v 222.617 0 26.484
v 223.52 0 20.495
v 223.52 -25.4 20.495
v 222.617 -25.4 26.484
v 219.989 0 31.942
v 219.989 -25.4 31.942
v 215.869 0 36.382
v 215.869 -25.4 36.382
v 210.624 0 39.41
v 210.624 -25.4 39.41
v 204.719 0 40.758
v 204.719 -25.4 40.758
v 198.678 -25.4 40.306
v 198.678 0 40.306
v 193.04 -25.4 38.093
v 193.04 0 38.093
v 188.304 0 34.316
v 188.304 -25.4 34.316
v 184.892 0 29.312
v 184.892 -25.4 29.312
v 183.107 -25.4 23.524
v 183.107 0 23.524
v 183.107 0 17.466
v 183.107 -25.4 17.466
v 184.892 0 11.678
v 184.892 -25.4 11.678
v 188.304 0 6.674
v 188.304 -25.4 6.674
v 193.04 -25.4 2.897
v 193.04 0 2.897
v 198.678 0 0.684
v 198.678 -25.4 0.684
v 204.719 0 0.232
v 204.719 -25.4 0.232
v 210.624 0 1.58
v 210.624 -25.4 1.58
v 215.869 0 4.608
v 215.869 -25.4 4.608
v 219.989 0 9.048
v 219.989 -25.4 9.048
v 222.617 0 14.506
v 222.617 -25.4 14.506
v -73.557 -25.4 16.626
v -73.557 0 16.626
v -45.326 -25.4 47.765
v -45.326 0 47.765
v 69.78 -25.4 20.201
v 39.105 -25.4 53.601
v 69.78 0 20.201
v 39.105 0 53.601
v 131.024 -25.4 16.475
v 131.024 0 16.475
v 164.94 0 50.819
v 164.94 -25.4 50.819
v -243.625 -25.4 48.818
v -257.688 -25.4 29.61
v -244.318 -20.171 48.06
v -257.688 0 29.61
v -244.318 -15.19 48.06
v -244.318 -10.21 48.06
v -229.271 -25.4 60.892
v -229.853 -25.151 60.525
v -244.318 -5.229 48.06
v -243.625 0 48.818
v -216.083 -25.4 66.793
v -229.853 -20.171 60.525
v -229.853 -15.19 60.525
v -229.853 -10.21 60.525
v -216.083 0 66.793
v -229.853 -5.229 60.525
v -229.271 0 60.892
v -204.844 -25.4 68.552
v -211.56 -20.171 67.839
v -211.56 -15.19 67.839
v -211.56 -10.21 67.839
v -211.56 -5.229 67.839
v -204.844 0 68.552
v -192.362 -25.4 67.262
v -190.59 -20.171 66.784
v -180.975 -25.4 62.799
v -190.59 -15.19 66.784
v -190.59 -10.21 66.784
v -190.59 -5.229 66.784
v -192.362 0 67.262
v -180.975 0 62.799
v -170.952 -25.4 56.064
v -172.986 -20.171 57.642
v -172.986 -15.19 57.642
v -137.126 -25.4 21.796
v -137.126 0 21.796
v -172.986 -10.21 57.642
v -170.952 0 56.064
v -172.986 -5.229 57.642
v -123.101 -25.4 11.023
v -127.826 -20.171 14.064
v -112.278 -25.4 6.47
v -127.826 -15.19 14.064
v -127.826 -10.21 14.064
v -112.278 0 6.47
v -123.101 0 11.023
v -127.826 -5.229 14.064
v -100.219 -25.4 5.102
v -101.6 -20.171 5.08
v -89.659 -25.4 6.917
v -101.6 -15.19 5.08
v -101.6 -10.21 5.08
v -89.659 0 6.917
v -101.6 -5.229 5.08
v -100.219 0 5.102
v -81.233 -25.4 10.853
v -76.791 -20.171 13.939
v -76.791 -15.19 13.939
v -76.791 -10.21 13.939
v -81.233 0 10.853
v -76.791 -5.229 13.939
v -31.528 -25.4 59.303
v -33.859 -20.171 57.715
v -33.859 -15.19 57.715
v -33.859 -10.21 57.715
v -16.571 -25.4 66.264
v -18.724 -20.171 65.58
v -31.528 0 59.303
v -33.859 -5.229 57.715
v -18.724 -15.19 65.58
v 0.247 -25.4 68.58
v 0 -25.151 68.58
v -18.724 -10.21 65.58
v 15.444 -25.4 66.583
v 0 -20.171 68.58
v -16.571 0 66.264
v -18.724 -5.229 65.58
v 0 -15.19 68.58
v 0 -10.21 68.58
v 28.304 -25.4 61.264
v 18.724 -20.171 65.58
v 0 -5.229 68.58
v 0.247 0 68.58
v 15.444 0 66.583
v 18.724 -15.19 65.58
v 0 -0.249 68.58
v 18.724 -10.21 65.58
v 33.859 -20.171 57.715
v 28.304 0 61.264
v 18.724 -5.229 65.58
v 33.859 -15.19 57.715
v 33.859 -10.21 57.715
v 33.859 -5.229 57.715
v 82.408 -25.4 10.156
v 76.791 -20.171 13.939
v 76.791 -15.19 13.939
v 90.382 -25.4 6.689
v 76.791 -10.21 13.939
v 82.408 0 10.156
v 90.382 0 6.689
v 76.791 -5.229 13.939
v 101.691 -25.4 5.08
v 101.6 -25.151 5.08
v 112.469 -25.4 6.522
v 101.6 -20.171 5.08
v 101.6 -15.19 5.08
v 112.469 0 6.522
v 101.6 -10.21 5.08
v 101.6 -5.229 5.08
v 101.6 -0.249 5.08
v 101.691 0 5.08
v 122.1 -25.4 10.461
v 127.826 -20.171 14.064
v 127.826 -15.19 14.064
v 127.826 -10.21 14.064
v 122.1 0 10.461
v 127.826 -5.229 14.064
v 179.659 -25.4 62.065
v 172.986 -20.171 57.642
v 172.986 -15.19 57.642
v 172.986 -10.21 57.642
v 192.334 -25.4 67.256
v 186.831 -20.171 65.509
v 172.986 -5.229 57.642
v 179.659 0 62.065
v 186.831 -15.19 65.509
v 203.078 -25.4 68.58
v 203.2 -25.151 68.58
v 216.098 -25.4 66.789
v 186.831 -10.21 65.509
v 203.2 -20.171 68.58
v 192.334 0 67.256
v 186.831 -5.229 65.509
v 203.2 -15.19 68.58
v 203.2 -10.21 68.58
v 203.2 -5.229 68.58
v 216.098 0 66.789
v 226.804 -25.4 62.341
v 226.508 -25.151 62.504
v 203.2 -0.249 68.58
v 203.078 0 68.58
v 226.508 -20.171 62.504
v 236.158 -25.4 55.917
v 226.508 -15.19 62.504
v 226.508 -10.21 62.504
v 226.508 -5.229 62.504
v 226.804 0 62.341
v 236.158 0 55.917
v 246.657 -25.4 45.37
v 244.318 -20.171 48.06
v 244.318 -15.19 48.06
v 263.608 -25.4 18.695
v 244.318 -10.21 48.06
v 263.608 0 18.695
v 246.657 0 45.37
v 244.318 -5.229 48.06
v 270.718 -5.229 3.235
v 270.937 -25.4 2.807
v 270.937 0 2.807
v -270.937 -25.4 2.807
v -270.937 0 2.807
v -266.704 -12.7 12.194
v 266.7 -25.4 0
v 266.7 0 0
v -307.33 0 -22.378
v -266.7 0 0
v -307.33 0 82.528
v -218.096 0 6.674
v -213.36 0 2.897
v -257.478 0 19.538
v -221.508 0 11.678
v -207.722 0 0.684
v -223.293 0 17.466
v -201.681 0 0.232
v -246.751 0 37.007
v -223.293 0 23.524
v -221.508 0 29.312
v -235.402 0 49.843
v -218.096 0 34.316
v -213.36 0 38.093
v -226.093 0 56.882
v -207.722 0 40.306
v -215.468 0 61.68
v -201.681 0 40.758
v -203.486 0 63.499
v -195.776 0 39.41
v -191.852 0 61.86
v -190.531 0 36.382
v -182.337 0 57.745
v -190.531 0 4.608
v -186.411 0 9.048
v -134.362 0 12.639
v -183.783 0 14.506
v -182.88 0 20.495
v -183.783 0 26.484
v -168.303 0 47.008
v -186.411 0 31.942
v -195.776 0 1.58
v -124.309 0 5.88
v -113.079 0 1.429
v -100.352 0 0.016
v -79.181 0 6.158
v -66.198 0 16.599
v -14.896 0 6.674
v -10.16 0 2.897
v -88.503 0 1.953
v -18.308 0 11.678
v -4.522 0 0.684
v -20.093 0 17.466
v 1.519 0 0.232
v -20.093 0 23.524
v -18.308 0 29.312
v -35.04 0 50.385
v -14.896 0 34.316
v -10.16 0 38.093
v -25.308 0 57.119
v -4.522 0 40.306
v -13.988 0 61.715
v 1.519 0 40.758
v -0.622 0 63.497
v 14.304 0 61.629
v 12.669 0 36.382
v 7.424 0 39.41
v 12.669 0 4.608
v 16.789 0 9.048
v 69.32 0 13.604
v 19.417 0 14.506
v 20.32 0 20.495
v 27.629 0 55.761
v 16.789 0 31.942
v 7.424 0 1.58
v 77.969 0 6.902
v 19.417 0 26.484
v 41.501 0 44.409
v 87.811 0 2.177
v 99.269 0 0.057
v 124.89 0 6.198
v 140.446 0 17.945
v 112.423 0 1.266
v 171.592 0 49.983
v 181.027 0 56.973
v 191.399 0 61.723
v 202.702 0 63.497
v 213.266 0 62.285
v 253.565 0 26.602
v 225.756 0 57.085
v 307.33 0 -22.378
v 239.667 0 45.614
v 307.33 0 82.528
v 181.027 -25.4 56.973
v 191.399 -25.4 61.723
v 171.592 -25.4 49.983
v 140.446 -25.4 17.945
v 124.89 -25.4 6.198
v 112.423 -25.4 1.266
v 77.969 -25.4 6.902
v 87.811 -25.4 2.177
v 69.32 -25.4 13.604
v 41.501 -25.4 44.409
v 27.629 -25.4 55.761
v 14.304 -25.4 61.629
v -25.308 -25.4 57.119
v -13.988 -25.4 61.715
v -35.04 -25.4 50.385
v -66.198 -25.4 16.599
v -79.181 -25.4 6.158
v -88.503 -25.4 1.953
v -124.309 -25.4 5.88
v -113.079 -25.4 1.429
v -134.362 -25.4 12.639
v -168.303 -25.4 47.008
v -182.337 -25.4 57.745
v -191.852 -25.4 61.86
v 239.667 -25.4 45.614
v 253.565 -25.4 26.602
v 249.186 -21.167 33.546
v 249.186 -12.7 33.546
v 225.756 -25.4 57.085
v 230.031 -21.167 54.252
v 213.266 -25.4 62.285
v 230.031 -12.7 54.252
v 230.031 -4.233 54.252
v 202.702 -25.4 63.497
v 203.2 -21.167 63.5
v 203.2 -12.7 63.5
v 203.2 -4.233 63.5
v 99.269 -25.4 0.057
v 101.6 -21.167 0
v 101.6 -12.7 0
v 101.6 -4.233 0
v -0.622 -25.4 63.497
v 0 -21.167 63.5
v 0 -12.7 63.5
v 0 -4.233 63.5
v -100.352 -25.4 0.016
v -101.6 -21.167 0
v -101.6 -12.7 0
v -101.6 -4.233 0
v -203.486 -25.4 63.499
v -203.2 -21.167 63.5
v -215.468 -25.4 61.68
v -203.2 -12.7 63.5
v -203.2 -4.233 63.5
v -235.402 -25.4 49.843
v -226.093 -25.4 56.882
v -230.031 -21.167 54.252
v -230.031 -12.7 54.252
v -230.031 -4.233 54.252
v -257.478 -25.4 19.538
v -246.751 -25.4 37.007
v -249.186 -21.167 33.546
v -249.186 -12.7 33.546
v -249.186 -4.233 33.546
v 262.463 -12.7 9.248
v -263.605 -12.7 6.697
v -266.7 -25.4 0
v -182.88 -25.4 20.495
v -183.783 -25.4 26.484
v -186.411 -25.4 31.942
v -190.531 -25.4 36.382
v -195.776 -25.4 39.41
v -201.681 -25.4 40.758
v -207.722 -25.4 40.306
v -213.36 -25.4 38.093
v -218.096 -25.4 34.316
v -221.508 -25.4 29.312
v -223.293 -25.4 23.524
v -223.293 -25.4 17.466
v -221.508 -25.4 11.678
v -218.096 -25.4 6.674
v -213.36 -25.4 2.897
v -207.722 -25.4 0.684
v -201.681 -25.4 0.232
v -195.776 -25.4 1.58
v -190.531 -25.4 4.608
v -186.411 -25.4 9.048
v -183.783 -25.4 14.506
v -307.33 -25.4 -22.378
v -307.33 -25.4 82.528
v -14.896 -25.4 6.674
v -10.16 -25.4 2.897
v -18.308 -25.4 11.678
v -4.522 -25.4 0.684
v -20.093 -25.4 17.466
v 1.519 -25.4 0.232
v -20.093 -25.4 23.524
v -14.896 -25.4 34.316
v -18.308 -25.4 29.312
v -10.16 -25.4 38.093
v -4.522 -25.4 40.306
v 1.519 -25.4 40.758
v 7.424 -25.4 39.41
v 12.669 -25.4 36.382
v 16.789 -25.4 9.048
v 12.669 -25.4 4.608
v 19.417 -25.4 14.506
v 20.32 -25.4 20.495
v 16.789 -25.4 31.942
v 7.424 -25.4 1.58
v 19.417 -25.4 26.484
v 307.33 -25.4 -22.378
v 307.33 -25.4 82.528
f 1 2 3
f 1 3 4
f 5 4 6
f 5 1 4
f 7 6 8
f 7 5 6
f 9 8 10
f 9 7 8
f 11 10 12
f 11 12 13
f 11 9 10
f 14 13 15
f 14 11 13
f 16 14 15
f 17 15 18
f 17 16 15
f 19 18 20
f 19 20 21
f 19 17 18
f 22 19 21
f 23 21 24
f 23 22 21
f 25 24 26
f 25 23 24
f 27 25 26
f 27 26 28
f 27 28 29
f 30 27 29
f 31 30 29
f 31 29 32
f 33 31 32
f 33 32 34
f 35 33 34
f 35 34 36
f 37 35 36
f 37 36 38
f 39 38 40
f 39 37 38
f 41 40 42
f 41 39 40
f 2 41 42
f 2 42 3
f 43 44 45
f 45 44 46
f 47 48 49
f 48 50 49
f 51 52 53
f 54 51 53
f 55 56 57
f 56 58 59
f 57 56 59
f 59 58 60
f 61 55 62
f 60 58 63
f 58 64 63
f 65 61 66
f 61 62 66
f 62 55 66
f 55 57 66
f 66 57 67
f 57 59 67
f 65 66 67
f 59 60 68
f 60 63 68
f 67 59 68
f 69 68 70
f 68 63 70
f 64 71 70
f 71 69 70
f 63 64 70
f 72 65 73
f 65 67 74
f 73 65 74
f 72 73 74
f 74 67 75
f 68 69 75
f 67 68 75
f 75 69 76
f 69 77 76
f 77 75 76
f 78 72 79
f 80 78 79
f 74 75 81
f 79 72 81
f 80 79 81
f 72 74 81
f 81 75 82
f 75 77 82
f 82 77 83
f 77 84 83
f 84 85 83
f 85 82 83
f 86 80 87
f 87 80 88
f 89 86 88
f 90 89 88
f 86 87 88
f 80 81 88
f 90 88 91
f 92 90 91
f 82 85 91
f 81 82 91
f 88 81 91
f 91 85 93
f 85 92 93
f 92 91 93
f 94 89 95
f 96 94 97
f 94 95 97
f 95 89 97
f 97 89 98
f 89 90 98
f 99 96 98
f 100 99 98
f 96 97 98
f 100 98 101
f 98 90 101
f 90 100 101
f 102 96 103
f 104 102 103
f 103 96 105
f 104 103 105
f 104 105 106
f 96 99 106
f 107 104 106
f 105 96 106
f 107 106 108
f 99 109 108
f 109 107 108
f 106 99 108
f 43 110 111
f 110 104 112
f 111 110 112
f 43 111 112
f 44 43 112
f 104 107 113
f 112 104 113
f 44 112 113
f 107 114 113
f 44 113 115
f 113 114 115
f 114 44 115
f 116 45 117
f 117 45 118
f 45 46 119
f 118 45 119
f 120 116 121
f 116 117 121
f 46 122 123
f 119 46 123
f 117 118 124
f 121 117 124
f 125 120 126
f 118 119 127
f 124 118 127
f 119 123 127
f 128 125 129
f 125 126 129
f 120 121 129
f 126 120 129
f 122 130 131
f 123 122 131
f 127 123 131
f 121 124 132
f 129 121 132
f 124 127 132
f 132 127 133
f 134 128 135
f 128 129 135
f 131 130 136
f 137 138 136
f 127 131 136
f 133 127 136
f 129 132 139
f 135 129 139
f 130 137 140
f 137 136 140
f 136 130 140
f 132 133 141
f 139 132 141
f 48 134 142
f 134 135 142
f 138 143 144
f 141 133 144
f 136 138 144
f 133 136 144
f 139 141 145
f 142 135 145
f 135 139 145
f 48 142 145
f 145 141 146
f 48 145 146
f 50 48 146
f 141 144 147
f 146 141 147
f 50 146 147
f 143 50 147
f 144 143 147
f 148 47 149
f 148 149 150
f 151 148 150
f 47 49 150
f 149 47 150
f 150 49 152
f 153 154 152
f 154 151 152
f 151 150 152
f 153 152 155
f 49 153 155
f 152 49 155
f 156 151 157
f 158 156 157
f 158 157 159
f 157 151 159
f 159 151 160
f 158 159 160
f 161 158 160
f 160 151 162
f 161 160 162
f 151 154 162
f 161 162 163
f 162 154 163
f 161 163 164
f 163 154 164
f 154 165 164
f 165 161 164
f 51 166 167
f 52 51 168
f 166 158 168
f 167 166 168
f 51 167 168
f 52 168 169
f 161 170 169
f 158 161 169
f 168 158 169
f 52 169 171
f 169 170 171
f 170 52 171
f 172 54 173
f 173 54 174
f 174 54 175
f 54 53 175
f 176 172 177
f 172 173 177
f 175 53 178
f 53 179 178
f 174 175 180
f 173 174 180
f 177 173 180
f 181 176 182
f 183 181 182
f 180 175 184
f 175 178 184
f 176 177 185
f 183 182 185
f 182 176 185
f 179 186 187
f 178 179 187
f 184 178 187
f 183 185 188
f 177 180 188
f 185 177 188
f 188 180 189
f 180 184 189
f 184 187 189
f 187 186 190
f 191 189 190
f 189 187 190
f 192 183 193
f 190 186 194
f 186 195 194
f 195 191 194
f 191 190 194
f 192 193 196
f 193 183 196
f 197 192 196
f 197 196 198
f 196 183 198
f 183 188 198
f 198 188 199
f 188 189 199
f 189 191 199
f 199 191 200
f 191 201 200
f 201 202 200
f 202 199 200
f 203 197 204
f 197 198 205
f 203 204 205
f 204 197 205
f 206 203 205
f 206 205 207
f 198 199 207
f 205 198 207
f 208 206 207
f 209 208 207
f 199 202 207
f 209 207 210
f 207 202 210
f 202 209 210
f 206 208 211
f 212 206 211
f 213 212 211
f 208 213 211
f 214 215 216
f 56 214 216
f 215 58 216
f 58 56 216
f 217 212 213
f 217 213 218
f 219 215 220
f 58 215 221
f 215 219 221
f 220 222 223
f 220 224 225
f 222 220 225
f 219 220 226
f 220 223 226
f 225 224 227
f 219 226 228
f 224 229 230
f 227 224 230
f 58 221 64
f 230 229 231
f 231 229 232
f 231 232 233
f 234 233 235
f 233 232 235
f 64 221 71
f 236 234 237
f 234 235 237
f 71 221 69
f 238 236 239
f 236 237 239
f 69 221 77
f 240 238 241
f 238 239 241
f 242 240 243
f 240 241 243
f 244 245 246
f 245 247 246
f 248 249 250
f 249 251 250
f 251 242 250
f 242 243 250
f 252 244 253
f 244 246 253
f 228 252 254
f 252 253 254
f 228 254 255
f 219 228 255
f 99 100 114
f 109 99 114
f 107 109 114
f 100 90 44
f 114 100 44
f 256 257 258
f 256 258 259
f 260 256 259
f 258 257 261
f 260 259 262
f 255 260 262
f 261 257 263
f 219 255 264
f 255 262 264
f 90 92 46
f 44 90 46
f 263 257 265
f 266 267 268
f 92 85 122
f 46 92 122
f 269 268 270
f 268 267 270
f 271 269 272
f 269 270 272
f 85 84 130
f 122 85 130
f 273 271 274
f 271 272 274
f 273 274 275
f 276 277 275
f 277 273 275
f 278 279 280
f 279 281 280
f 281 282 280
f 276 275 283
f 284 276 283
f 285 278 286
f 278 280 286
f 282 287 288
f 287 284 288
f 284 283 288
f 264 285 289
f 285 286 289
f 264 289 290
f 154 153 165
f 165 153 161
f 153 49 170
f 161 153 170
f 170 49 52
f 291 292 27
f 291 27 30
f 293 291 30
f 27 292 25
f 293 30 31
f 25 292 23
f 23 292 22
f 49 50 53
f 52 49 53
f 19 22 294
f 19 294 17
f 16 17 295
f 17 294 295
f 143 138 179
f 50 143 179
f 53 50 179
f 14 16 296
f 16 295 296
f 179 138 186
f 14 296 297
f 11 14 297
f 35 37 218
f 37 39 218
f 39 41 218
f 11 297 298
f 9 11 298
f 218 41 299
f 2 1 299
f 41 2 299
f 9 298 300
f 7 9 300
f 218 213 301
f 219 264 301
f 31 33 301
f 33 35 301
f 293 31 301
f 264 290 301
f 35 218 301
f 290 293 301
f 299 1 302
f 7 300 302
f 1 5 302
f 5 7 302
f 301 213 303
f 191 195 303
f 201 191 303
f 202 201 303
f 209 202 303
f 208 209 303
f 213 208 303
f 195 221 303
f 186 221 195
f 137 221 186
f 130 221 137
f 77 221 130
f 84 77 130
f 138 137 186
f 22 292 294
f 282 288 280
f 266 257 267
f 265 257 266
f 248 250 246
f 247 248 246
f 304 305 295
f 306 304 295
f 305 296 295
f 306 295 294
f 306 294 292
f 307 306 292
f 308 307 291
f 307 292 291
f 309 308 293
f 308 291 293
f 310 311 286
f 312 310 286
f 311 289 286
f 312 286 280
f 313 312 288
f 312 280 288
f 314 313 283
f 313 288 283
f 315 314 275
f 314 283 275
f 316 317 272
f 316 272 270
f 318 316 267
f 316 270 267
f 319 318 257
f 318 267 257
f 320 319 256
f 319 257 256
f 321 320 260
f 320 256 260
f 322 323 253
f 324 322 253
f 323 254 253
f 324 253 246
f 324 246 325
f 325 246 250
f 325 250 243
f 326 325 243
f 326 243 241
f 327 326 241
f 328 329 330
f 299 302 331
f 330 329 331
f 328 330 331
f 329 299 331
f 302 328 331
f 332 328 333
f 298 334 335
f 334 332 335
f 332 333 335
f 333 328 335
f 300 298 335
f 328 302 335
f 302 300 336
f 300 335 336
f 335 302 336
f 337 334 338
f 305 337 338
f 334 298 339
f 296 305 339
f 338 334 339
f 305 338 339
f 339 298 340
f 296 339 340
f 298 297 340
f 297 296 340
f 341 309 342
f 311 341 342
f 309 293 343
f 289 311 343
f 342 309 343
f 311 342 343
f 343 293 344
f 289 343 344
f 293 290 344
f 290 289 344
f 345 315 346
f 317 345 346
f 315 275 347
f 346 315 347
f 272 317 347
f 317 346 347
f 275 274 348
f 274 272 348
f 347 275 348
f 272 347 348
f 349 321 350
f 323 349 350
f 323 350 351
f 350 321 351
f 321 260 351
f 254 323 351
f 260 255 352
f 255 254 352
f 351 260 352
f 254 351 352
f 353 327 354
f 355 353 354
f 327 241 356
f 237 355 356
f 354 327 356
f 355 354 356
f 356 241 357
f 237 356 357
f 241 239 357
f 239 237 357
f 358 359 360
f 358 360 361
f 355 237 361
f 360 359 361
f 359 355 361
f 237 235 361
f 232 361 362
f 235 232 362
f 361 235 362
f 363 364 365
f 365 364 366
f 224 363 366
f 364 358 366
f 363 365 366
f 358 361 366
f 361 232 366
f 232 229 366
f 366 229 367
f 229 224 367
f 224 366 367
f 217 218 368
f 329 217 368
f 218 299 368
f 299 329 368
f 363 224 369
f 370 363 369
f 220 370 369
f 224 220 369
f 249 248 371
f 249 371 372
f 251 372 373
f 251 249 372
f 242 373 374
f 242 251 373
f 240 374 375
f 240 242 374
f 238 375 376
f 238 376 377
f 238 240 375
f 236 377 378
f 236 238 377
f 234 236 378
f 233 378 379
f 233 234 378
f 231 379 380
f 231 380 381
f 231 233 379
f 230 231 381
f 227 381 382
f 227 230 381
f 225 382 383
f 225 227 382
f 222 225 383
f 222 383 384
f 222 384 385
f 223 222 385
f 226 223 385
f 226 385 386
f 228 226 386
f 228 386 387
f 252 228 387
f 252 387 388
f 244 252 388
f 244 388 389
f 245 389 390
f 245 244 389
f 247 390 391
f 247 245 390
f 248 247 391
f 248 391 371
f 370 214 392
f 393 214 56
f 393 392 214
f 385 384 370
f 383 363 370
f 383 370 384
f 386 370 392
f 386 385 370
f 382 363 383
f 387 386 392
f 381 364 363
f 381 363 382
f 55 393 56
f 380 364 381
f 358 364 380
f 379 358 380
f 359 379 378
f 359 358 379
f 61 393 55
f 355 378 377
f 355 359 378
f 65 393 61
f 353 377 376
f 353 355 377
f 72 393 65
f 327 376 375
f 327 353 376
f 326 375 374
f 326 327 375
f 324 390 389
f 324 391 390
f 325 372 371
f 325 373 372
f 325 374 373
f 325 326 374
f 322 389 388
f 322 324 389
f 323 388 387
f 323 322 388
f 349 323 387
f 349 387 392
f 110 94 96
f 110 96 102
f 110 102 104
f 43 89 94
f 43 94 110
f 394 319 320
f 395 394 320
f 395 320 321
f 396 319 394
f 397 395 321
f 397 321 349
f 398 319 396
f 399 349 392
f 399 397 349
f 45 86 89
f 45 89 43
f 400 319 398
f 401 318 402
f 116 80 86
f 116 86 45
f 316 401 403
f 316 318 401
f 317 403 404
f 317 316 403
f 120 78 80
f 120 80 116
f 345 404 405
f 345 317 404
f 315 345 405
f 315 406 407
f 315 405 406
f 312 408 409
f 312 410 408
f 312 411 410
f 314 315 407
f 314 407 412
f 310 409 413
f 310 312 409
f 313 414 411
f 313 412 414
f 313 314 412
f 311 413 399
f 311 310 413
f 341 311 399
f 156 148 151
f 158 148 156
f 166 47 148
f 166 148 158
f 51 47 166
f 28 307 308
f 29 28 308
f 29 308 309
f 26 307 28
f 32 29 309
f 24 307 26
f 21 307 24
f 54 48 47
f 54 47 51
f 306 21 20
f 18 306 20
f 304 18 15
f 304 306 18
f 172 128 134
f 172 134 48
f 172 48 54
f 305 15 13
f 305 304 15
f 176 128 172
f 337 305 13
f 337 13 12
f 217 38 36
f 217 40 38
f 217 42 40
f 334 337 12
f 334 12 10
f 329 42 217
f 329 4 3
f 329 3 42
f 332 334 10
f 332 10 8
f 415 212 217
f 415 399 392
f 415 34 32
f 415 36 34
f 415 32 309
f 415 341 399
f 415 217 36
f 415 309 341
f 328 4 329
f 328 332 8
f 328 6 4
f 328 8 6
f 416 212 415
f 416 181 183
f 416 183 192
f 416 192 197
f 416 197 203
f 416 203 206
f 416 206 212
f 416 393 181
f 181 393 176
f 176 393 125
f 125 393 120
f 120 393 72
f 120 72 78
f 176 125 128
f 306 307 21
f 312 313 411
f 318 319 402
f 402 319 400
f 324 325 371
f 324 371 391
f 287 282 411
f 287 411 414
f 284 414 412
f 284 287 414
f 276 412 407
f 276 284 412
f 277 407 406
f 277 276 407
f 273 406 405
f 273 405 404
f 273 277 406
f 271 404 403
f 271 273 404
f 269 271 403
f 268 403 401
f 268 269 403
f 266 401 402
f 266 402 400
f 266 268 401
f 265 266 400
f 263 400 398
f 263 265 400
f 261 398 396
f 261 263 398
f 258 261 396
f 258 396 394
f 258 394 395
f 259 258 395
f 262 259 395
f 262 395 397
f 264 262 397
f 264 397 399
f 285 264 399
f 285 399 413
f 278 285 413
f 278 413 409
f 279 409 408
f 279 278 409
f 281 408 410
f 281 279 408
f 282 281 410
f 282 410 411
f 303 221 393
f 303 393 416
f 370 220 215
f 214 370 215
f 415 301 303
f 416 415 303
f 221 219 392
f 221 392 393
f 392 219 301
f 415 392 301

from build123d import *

# Parameters (mm, degrees)
F0_W     = 614.6593689919
F0_H     = 104.9060299742
F0_R     = 20.32
F1_DEPTH = 25.4


# Not quite as in the source:
# - ends of sketch curves that miss each other by under 0.0002 mm in the source are joined
# - the dataset's text gives a spline's control points without its knots; the knots are read off the source's solid


with BuildPart() as f1:
    # F0 (on Front) → F1 (new body)
    with BuildSketch(Plane.XZ):
        with Locations((0, 30.0749056167)):
            Rectangle(F0_W, F0_H)
        with Locations((-203.2, 20.4950086772)):
            Circle(F0_R, mode=Mode.SUBTRACT)
        with Locations((0, 20.4950086772)):
            Circle(F0_R, mode=Mode.SUBTRACT)
        with Locations((203.2, 20.4950086772)):
            Circle(F0_R, mode=Mode.SUBTRACT)
        with BuildLine():
            add(Edge.make_bspline(
                [(0, 63.5), (50.8, 63.5), (56.1175370932, 0), (101.6, 0)],
                knots=[0, 0, 0, 0, 119.8115603771, 119.8115603771, 119.8115603771, 119.8115603771], degree=3))
            add(Edge.make_bspline(
                [(0, 63.5), (-50.8, 63.5), (-56.1175370932, 0), (-101.6, 0)],
                knots=[0, 0, 0, 0, 119.8115603771, 119.8115603771, 119.8115603771, 119.8115603771], degree=3))
            add(Edge.make_bspline(
                [(-101.6, 0), (-147.0824629068, 0), (-161.2765789032, 63.5), (-203.2, 63.5)],
                knots=[0, 0, 0, 0, 119.8115603771, 119.8115603771, 119.8115603771, 119.8115603771], degree=3))
            add(Edge.make_bspline(
                [(-203.2, 63.5), (-244.3384826183, 63.5), (-263.5250381589, 4.789814353), (-266.7, 0)],
                knots=[0, 0, 0, 0, 89.8025612107, 89.8025612107, 89.8025612107, 89.8025612107], degree=3))
            Line((-266.7, 0), (-270.9370674539, 2.8072381066))
            add(Edge.make_bspline(
                [(-203.2, 68.58), (-206.0749247482, 68.58), (-211.6570572562, 68.0654677515), (-219.449703116, 65.9327946823), (-226.6139167838, 62.6573237184), (-235.3214664022, 57.0619610705), (-242.8084043286, 50.0452799381), (-249.2087272272, 42.3342188514), (-253.4945356129, 36.3678079721), (-257.2899146838, 30.3831174449), (-260.614540304, 24.5429222876), (-263.4845904473, 19.0110013278), (-265.5085267197, 14.7960229142), (-266.9118861506, 11.7464153334), (-267.8572021622, 9.6427688992), (-268.6955290239, 7.7460864416), (-269.4259857327, 6.0820696315), (-269.9424600992, 4.9140477877), (-270.2959565612, 4.1311962061), (-270.5287914392, 3.627286717), (-270.6926175205, 3.2849255658), (-270.8015436387, 3.065424442), (-270.8703935577, 2.930969375), (-270.9134306119, 2.8501874319), (-270.9322031409, 2.8160102358), (-270.9370674539, 2.8072381066)],
                knots=[0, 0, 0, 0, 0.062536818, 0.125073636, 0.1876104541, 0.2501472721, 0.3752209081, 0.4377577261, 0.5002945442, 0.5628313622, 0.6253681802, 0.6879049982, 0.7504418162, 0.7817102252, 0.8129786342, 0.8442470433, 0.8755154523, 0.9067838613, 0.9224180658, 0.9380522703, 0.9536864748, 0.961503577, 0.9693206793, 0.9771377815, 0.9803545729, 0.9803545729, 0.9803545729, 0.9803545729], degree=3))
            add(Edge.make_bspline(
                [(-101.6, 5.08), (-104.1471371, 5.08), (-108.9825494519, 5.5227985642), (-115.6526939013, 7.3372474831), (-121.9092103663, 10.1773367447), (-127.8642663749, 13.932751749), (-133.5886395499, 18.4728381682), (-140.9907545945, 25.3635161712), (-149.9577750737, 35.1135642507), (-159.0396450213, 45.1591389287), (-166.7656656648, 52.6297090899), (-172.9079254728, 57.7563865096), (-179.5208319726, 62.1967681684), (-186.7206430613, 65.7097554828), (-194.5808153214, 68.0207957165), (-200.2591817799, 68.58), (-203.2, 68.58)],
                knots=[0, 0, 0, 0, 0.0625, 0.125, 0.1875, 0.25, 0.3125, 0.375, 0.5, 0.625, 0.6875, 0.75, 0.8125, 0.875, 0.9375, 1, 1, 1, 1], degree=3))
            add(Edge.make_bspline(
                [(0, 68.58), (-3.4395833333, 68.58), (-9.9907230249, 68.0415568729), (-18.8754835158, 65.7852306257), (-26.8494717203, 62.2976627153), (-33.979773011, 57.8349170952), (-40.3831564519, 52.6526314317), (-48.14551851, 45.0924908704), (-56.7790114699, 34.9489891198), (-64.9188221861, 25.1689190997), (-71.5831601125, 18.303665252), (-76.7480703911, 13.8055020439), (-82.1704530142, 10.1054105506), (-87.9633960673, 7.3142638881), (-94.302168804, 5.5228017002), (-99.0528629, 5.08), (-101.6, 5.08)],
                knots=[0, 0, 0, 0, 0.0625, 0.125, 0.1875, 0.25, 0.3125, 0.375, 0.5, 0.625, 0.6875, 0.75, 0.8125, 0.875, 0.9375, 1, 1, 1, 1], degree=3))
            add(Edge.make_bspline(
                [(0, 68.58), (3.4395833333, 68.58), (9.9907230249, 68.0415568729), (18.8754835158, 65.7852306257), (26.8494717203, 62.2976627153), (33.979773011, 57.8349170952), (40.3831564519, 52.6526314317), (48.14551851, 45.0924908704), (56.7790114699, 34.9489891198), (64.9188221861, 25.1689190997), (71.5831601125, 18.303665252), (76.7480703911, 13.8055020439), (82.1704530142, 10.1054105506), (87.9633960673, 7.3142638881), (94.302168804, 5.5228017002), (99.0528629, 5.08), (101.6, 5.08)],
                knots=[0, 0, 0, 0, 0.0625, 0.125, 0.1875, 0.25, 0.3125, 0.375, 0.5, 0.625, 0.6875, 0.75, 0.8125, 0.875, 0.9375, 1, 1, 1, 1], degree=3))
            add(Edge.make_bspline(
                [(101.6, 5.08), (104.1471371, 5.08), (108.9825494519, 5.5227985642), (115.6526939013, 7.3372474831), (121.9092103663, 10.1773367447), (127.8642663749, 13.932751749), (133.5886395499, 18.4728381682), (140.9907545945, 25.3635161712), (149.9577750737, 35.1135642507), (159.0396450213, 45.1591389287), (166.7656656648, 52.6297090899), (172.9079254728, 57.7563865096), (179.5208319726, 62.1967681684), (186.7206430613, 65.7097554828), (194.5808153214, 68.0207957165), (200.2591817799, 68.58), (203.2, 68.58)],
                knots=[0, 0, 0, 0, 0.0625, 0.125, 0.1875, 0.25, 0.3125, 0.375, 0.5, 0.625, 0.6875, 0.75, 0.8125, 0.875, 0.9375, 1, 1, 1, 1], degree=3))
            add(Edge.make_bspline(
                [(203.2, 68.58), (206.0749247482, 68.58), (211.6570572562, 68.0654677515), (219.449703116, 65.9327946823), (226.6139167838, 62.6573237184), (235.3214664022, 57.0619610705), (242.8084043286, 50.0452799381), (249.2087272272, 42.3342188514), (253.4945356129, 36.3678079721), (257.2899146838, 30.3831174449), (260.614540304, 24.5429222876), (263.4845904473, 19.0110013278), (265.5085267197, 14.7960229142), (266.9118861506, 11.7464153334), (267.8572021622, 9.6427688992), (268.6955290239, 7.7460864416), (269.4259857327, 6.0820696315), (269.9424600992, 4.9140477877), (270.2959565612, 4.1311962061), (270.5287914392, 3.627286717), (270.6926175205, 3.2849255658), (270.8015436387, 3.065424442), (270.8703935577, 2.930969375), (270.9134306119, 2.8501874319), (270.9322031409, 2.8160102358), (270.9370672724, 2.8072380059)],
                knots=[0, 0, 0, 0, 0.062536818, 0.125073636, 0.1876104541, 0.2501472721, 0.3752209081, 0.4377577261, 0.5002945442, 0.5628313622, 0.6253681802, 0.6879049982, 0.7504418162, 0.7817102252, 0.8129786342, 0.8442470433, 0.8755154523, 0.9067838613, 0.9224180658, 0.9380522703, 0.9536864748, 0.961503577, 0.9693206793, 0.9771377815, 0.9803545729, 0.9803545729, 0.9803545729, 0.9803545729], degree=3))
            Line((270.9370672724, 2.8072380059), (266.7, 0))
            add(Edge.make_bspline(
                [(203.2, 63.5), (244.3384826183, 63.5), (263.5250381589, 4.789814353), (266.7, 0)],
                knots=[0, 0, 0, 0, 89.8025612107, 89.8025612107, 89.8025612107, 89.8025612107], degree=3))
            add(Edge.make_bspline(
                [(101.6, 0), (147.0824629068, 0), (161.2765789032, 63.5), (203.2, 63.5)],
                knots=[0, 0, 0, 0, 119.8115603771, 119.8115603771, 119.8115603771, 119.8115603771], degree=3))
        make_face(mode=Mode.SUBTRACT)
    extrude(amount=F1_DEPTH)


solid = f1.part
